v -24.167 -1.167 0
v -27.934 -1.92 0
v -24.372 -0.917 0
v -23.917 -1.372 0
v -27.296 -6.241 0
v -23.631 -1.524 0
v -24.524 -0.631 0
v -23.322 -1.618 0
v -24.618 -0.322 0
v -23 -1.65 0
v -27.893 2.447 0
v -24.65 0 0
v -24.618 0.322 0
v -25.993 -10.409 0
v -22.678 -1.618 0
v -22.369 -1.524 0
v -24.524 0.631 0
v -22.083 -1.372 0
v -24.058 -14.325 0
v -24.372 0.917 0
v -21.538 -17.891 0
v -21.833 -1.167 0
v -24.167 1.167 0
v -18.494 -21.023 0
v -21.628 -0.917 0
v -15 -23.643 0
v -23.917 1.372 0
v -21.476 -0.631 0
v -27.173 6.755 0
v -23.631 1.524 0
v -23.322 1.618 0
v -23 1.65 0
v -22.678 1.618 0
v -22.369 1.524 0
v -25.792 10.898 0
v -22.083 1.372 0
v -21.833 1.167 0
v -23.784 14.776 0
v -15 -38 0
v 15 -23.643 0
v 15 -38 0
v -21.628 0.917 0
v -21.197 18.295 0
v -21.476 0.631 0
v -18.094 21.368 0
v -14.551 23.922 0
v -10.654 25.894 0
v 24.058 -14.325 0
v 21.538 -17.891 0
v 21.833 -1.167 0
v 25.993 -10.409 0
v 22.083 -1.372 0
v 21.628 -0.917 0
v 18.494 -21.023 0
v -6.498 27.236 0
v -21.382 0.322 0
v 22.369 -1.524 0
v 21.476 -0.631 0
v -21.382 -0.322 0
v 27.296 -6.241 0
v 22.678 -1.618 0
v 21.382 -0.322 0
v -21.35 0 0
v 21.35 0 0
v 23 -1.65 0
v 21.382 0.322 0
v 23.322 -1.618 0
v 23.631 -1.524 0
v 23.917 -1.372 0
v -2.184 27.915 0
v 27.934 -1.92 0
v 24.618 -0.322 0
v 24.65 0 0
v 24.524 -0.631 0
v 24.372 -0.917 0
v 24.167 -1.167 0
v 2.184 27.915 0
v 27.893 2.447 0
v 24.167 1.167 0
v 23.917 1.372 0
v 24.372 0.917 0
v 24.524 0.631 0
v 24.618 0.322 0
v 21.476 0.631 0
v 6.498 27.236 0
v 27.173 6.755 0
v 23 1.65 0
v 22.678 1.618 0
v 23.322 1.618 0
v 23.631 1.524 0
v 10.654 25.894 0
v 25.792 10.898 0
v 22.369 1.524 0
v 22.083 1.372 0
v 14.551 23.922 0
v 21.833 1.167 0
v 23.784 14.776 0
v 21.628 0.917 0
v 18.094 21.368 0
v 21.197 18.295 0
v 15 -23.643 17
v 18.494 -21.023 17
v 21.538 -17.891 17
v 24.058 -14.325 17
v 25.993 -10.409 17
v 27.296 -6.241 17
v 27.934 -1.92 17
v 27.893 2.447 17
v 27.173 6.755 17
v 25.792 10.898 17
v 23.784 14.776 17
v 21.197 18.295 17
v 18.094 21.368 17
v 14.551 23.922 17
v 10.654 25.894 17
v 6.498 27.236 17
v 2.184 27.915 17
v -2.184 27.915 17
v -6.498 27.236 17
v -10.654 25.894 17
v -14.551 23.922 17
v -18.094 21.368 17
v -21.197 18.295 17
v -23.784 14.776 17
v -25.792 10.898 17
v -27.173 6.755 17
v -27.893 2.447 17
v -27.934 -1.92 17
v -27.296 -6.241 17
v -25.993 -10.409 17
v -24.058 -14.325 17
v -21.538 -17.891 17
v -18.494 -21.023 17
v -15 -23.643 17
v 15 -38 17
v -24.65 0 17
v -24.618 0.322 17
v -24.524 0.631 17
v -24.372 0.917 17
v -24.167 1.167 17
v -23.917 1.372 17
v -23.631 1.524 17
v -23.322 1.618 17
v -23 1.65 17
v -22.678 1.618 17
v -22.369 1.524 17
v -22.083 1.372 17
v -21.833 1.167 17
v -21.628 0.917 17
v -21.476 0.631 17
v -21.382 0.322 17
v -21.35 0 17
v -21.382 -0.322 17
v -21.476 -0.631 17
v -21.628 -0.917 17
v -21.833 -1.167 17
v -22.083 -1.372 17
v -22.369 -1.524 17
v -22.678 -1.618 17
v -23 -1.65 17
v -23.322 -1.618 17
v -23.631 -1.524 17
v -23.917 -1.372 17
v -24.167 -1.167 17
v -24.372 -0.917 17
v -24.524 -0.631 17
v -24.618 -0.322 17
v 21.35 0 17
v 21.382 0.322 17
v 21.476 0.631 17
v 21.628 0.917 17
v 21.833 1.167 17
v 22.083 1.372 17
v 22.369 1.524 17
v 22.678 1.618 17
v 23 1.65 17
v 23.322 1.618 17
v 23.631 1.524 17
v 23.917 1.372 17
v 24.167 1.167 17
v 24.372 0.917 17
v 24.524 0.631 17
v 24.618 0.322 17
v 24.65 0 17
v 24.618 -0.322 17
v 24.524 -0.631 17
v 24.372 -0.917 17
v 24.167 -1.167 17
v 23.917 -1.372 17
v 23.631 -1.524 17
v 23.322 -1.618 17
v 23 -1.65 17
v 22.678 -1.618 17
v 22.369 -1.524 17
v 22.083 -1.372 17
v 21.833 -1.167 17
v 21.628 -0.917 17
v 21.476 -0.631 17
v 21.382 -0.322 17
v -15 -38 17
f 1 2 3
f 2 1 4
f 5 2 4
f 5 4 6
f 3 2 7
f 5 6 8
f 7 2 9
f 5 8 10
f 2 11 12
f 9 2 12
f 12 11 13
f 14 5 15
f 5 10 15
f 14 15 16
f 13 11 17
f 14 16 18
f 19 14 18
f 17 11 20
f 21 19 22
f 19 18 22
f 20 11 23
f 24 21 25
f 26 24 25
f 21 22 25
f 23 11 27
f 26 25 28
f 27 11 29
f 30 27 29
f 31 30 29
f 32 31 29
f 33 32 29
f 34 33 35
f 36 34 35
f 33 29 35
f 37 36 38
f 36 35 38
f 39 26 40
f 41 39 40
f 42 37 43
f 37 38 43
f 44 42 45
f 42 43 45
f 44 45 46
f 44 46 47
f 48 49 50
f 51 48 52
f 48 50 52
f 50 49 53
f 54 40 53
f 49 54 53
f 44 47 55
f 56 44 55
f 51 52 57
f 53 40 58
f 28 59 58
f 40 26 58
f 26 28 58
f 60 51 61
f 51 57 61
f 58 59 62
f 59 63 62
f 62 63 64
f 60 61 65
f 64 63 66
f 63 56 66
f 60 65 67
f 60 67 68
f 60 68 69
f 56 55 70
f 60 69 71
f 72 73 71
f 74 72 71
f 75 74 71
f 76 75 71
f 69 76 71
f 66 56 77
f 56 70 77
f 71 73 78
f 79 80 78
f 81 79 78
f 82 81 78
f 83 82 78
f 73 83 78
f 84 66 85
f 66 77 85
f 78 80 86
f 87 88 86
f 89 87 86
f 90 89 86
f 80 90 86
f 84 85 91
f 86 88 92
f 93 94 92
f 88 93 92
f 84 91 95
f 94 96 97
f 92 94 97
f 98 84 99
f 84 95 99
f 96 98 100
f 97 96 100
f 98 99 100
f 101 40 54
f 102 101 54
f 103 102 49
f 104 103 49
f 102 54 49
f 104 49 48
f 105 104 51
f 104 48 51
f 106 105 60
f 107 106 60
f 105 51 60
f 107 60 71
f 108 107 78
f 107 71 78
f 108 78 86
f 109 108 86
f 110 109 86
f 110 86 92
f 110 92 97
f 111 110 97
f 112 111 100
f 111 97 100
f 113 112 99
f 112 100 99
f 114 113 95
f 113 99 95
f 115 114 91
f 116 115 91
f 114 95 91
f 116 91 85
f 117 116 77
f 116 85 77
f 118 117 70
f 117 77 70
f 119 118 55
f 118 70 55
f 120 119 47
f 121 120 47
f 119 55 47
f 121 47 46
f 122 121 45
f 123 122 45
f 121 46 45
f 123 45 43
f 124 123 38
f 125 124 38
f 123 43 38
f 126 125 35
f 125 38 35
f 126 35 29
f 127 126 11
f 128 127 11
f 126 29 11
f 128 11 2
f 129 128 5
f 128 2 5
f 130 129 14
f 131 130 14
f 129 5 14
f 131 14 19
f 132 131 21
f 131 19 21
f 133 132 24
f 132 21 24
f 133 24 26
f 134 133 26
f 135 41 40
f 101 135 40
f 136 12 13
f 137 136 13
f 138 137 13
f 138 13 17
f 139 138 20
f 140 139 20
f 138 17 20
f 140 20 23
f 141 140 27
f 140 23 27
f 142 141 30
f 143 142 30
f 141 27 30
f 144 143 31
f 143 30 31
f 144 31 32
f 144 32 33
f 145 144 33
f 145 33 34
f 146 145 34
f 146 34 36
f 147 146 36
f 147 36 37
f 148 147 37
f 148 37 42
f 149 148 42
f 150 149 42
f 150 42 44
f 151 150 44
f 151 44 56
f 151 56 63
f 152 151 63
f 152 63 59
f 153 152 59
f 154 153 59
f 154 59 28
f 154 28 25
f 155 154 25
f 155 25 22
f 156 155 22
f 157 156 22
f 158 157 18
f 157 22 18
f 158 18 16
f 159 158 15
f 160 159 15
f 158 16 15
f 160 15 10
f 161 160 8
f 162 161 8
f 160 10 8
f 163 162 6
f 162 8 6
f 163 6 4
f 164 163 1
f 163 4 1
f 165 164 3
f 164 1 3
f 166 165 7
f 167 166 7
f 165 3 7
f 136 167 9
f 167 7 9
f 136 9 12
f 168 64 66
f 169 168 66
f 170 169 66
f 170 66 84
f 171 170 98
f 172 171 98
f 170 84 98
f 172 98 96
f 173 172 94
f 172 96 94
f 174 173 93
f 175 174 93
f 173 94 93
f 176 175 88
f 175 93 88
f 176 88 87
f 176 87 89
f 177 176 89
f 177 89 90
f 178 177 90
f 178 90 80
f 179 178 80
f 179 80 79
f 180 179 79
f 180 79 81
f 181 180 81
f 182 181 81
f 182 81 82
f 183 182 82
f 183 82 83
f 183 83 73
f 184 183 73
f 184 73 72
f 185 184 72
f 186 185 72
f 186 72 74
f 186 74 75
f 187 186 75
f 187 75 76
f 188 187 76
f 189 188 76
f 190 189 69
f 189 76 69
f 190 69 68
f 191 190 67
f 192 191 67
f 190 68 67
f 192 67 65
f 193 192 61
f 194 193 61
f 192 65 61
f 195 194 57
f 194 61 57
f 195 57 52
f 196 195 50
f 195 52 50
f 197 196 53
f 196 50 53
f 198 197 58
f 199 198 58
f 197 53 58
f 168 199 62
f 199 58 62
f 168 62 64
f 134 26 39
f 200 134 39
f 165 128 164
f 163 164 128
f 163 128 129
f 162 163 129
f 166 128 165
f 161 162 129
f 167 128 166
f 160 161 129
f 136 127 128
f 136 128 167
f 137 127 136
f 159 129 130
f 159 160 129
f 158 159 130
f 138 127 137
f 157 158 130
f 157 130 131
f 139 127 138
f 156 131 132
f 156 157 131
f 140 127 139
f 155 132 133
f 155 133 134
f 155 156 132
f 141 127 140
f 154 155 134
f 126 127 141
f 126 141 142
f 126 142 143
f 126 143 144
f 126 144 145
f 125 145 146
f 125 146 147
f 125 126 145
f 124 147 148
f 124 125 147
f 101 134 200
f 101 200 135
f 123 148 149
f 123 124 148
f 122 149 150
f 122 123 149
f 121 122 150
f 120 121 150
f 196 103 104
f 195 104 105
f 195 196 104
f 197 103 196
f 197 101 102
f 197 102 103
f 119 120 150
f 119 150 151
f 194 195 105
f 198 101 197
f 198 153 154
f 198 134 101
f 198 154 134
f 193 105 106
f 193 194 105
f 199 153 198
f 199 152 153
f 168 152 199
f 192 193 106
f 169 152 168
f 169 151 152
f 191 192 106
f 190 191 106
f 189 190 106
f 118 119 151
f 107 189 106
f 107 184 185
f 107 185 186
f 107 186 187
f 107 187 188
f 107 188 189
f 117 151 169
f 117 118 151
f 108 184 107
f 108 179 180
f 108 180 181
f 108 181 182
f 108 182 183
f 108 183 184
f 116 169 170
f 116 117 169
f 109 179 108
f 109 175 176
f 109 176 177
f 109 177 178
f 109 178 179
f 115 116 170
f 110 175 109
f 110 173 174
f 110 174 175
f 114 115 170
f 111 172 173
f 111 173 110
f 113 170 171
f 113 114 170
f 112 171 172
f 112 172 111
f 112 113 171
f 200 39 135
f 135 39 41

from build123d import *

# Parameters (mm, degrees)
BOSS_EXTRUDE1_DEPTH            = 17
F_3_3_3_3_DIAMETER_HOLE1_D     = 3.3
F_3_3_3_3_DIAMETER_HOLE1_DEPTH = 25
F_3_3_3_3_DIAMETER_HOLE1_TIP   = 0.991420021


with BuildPart() as part:
    # Sketch1 → Boss-Extrude1 (new body)
    with BuildSketch(Plane.XY):
        with BuildLine():
            Line((-15, -23.643180835), (-15, -38))
            Line((-15, -38), (15, -38))
            Line((15, -38), (15, -23.643180835))
            ThreePointArc((15, -23.643180835), (0, 28), (-15, -23.643180835))
        make_face()
    extrude(amount=BOSS_EXTRUDE1_DEPTH)

    # Ø3.3 (3.3) Diameter Hole1
    with Locations(Plane.XY.offset(17)):
        with Locations((-23, 0), (23, 0)):
            Hole(F_3_3_3_3_DIAMETER_HOLE1_D / 2, depth=F_3_3_3_3_DIAMETER_HOLE1_DEPTH)
            with Locations((0, 0, -(F_3_3_3_3_DIAMETER_HOLE1_DEPTH + F_3_3_3_3_DIAMETER_HOLE1_TIP / 2))):  # 118° drill point
                Cone(0, F_3_3_3_3_DIAMETER_HOLE1_D / 2, F_3_3_3_3_DIAMETER_HOLE1_TIP, mode=Mode.SUBTRACT)


solid = part.part
